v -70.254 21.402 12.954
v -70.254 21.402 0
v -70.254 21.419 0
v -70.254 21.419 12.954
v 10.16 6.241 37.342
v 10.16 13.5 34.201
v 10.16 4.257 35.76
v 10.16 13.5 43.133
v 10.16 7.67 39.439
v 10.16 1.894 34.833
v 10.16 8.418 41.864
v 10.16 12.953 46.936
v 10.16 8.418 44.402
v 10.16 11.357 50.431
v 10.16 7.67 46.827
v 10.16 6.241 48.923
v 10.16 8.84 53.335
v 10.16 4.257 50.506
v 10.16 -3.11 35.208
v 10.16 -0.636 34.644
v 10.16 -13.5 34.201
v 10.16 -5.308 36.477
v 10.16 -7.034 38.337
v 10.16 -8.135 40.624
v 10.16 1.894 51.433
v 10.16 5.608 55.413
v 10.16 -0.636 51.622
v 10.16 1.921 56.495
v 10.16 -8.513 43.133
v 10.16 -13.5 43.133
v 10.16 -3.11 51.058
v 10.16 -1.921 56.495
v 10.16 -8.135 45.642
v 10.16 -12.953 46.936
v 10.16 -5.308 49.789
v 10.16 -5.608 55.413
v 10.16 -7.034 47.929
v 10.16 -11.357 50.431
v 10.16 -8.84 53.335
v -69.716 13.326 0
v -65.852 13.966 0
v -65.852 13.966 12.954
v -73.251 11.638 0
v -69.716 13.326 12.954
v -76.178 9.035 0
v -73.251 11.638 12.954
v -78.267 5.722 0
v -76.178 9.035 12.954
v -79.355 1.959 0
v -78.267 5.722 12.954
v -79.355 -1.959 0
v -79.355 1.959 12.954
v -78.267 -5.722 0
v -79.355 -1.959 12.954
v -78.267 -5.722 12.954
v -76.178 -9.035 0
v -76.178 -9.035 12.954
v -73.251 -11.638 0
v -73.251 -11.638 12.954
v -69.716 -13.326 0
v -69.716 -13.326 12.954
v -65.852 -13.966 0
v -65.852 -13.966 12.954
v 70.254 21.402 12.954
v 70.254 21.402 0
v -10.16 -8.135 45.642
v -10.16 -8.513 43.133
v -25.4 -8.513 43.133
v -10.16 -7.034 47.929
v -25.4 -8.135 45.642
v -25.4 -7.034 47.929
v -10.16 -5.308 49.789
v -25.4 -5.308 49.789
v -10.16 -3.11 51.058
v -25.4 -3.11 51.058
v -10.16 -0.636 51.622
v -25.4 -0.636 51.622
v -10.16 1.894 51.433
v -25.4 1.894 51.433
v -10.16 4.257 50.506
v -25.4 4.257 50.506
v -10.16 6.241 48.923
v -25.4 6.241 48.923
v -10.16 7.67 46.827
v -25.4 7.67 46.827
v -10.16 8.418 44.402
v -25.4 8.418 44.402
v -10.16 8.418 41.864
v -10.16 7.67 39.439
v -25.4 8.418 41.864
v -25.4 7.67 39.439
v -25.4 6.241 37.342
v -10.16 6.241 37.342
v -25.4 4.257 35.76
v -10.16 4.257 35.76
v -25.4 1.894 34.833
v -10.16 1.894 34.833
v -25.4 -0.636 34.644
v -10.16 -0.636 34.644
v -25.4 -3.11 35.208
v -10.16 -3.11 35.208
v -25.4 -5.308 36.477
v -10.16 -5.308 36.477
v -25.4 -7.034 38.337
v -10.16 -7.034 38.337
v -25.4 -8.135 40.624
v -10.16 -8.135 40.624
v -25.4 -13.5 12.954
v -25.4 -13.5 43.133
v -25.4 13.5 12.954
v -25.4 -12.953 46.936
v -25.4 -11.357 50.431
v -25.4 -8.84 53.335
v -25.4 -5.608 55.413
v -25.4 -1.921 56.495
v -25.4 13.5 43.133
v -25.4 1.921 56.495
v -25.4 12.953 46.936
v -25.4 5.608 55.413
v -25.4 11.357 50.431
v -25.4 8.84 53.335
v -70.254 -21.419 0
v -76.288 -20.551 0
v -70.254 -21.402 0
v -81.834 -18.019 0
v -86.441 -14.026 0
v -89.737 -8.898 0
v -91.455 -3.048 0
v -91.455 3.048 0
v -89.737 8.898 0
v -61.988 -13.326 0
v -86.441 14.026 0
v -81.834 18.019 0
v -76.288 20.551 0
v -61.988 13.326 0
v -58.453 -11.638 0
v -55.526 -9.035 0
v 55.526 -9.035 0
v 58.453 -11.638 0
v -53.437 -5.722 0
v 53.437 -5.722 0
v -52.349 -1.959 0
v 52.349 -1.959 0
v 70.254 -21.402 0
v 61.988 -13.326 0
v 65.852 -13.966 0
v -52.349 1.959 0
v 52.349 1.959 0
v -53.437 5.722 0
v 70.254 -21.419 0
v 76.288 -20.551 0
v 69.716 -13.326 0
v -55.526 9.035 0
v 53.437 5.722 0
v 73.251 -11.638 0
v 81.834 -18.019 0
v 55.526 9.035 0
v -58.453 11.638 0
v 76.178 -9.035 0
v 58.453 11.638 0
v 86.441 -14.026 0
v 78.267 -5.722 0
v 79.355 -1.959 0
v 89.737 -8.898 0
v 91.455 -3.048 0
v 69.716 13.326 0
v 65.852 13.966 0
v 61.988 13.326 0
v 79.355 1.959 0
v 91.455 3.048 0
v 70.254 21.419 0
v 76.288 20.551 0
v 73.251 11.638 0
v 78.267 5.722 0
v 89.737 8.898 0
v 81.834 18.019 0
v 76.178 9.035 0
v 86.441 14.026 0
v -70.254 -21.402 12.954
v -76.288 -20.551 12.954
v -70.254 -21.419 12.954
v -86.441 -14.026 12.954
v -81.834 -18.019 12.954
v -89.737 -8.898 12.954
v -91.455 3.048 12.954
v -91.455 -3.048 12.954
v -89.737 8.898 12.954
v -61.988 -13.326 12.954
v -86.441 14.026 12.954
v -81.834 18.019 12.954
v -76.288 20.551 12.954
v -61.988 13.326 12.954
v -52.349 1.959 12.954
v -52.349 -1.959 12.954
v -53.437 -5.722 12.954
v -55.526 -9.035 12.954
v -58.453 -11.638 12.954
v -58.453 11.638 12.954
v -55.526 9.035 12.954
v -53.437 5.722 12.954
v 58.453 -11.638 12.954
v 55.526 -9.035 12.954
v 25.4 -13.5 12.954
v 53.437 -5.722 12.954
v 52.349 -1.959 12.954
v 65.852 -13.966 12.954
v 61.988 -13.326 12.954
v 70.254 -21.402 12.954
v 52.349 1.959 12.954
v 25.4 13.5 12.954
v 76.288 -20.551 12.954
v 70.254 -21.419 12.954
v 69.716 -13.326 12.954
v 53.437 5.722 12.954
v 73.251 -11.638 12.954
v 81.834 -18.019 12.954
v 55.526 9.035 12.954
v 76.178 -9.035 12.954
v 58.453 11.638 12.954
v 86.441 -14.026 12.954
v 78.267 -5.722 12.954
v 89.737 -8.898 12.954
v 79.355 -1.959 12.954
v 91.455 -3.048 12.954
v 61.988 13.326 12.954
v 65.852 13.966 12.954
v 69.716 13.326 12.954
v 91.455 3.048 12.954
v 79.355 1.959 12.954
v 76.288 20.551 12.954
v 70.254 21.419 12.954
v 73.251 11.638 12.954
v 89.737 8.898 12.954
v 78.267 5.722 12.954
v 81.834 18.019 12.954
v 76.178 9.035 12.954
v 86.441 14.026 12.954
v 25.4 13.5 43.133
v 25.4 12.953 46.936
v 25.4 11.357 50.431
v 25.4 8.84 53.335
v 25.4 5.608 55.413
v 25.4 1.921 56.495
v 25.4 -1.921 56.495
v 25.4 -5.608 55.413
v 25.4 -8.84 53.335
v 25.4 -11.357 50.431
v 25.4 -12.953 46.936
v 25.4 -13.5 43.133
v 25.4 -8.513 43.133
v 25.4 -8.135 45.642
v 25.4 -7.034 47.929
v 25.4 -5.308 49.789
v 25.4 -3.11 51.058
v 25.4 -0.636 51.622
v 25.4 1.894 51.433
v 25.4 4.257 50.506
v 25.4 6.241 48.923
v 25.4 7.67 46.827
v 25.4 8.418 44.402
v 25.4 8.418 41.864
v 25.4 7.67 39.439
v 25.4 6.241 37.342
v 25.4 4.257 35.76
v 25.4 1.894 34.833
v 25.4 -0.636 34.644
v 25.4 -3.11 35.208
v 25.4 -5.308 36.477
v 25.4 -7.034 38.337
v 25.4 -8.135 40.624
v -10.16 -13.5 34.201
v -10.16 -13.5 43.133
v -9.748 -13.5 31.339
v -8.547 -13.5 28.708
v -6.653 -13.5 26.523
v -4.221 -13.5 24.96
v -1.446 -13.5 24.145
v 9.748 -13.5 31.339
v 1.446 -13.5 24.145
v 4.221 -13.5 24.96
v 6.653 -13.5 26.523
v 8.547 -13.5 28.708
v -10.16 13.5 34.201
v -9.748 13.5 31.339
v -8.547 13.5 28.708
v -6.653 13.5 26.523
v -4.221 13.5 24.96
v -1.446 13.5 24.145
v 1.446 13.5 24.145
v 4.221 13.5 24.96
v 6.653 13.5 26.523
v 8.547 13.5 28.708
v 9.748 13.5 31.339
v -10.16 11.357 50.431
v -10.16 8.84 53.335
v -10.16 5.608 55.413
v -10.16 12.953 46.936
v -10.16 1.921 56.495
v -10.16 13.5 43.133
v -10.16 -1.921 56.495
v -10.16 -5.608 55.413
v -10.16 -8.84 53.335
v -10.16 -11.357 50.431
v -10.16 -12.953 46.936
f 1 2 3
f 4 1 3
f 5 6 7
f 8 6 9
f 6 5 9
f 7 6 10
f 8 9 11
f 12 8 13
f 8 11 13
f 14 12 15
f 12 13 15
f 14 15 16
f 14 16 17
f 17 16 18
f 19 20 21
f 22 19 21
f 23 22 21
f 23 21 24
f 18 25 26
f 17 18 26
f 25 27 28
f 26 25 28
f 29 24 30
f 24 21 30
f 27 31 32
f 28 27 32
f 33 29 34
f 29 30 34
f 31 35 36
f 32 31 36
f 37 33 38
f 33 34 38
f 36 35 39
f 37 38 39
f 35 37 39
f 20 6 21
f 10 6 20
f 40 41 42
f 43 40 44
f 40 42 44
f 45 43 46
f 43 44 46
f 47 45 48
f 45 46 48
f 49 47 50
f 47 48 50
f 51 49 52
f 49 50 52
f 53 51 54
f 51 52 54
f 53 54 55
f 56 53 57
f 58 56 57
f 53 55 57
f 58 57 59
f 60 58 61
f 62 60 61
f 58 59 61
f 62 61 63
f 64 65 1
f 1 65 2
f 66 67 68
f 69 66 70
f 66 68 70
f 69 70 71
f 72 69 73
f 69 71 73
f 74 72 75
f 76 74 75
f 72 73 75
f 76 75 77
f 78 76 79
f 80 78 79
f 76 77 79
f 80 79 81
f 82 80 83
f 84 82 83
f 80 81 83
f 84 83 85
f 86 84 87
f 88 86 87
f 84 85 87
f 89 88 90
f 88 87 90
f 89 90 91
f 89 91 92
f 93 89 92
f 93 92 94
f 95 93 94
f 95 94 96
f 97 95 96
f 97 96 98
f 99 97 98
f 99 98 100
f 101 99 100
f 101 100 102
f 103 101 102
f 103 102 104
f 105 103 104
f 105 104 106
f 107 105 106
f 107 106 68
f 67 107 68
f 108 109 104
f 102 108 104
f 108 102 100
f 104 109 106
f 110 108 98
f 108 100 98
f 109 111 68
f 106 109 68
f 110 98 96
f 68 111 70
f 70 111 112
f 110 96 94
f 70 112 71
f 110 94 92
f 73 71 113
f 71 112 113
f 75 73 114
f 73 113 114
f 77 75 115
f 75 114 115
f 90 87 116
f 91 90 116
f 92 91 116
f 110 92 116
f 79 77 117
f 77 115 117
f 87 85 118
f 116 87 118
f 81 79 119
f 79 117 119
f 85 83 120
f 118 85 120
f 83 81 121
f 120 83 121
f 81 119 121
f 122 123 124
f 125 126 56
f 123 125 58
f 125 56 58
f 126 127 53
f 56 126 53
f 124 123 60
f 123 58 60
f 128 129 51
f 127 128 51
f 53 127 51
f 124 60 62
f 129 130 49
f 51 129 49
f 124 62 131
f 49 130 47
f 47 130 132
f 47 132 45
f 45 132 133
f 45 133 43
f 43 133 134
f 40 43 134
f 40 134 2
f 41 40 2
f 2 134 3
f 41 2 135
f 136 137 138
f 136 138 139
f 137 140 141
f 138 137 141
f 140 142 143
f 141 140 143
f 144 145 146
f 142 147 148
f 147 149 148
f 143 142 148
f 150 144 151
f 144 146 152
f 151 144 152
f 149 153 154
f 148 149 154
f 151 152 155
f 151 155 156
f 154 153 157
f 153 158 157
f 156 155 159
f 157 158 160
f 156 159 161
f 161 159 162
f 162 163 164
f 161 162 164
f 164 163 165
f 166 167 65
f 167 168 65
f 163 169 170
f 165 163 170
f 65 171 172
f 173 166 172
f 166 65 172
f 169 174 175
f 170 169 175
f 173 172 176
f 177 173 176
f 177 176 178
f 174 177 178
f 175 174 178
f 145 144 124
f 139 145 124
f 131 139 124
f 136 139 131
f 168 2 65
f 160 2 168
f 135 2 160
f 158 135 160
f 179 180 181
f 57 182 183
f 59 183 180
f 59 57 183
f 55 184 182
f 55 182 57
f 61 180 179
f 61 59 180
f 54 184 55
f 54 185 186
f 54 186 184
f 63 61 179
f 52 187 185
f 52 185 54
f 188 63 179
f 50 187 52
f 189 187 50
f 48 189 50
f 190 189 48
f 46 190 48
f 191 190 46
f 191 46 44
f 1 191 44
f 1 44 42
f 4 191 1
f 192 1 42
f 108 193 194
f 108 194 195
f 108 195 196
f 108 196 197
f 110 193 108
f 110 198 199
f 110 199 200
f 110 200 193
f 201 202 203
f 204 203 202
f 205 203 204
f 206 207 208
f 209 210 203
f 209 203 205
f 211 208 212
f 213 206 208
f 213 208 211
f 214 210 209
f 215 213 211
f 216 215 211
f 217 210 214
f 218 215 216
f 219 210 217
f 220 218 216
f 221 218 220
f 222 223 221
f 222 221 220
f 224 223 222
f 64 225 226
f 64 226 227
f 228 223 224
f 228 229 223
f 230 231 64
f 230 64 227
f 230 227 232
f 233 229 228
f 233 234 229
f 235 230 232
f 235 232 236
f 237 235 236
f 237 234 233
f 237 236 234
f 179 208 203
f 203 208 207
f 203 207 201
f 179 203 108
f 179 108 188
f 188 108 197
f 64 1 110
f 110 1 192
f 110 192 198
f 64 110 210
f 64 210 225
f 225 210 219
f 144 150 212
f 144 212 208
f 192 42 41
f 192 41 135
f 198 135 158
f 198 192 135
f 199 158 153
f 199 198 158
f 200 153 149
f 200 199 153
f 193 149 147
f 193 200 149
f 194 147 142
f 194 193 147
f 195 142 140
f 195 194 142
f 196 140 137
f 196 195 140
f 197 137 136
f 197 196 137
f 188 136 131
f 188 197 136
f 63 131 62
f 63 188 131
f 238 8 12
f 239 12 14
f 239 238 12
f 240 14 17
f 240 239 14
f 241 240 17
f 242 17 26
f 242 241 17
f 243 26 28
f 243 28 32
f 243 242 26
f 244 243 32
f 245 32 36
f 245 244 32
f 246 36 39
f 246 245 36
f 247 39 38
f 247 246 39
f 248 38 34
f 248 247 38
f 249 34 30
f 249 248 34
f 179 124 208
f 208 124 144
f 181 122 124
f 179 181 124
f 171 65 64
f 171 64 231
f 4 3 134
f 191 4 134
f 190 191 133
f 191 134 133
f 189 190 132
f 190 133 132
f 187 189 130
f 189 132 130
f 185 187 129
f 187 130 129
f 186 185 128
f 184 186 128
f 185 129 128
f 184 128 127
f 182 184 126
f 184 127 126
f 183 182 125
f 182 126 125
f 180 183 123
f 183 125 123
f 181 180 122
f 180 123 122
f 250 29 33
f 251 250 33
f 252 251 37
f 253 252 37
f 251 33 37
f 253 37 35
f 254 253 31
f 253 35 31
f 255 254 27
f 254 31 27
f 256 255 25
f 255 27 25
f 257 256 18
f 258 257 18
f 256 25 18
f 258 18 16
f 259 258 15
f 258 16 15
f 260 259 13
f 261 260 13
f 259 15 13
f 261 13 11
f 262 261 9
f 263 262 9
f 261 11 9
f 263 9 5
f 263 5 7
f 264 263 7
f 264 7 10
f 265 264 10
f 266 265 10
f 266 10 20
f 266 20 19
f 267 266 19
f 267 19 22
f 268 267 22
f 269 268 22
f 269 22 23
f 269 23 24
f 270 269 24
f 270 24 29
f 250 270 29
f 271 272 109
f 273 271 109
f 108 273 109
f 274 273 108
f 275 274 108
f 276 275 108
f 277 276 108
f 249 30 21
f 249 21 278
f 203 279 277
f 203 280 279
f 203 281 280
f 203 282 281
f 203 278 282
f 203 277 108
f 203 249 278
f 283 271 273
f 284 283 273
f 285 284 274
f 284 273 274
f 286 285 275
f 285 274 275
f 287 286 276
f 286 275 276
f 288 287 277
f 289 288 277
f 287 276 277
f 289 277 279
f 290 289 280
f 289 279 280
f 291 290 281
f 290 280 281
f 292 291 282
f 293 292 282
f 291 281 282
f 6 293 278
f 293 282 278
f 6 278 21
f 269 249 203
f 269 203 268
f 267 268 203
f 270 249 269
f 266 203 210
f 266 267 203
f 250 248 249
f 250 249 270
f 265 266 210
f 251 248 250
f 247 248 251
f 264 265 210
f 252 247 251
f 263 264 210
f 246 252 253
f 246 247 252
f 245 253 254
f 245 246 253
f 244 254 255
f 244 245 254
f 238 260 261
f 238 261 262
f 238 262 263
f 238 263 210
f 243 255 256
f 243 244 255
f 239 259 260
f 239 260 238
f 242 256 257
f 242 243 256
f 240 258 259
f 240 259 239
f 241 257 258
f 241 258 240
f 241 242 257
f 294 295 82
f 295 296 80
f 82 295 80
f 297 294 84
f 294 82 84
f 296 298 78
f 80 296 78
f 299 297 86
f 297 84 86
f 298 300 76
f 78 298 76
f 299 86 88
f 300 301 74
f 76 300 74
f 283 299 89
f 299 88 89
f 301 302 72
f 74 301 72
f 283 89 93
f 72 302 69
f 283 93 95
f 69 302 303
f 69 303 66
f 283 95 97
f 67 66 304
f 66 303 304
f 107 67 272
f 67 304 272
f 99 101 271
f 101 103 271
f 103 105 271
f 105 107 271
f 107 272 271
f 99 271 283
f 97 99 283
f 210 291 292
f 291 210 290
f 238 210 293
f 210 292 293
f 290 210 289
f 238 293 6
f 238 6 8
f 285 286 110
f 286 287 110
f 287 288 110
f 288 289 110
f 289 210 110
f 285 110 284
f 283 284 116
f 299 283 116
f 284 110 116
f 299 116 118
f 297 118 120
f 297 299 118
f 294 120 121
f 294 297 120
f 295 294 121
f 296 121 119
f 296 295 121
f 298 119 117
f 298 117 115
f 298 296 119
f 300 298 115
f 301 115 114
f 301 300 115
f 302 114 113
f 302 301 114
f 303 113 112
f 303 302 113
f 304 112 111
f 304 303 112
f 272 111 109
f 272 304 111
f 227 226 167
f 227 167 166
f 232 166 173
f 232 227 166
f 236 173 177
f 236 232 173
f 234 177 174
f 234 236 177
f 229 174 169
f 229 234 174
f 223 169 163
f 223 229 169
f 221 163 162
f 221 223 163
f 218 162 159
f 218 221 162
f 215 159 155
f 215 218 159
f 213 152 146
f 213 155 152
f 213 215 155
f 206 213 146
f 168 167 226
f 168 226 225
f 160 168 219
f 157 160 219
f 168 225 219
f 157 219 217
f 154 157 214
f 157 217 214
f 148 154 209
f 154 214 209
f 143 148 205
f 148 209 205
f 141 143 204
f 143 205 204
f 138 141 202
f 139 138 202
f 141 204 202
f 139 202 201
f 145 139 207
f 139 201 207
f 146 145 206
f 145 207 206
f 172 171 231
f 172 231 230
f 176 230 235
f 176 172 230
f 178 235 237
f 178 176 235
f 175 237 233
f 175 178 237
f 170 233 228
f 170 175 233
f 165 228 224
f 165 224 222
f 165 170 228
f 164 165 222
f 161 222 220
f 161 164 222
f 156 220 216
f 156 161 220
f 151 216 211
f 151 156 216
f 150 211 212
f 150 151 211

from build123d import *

# Parameters (mm, degrees)
F1_DEPTH  = 12.954
F3_D      = 27.94
F3_DEPTH  = 20.32
F5_DEPTH  = 25.4
F8_DEPTH  = 34.919414
F9_R      = 8.513263
F10_DEPTH = 117.073686


with BuildPart() as f1:
    # F0 (on Top) → F1 (new body)
    with BuildSketch(Plane.XY):
        with BuildLine():
            Line((70.253901, 21.234231), (70.253901, 21.401851))
            Line((70.253901, 21.401851), (-70.253901, 21.401851))
            Line((-70.253901, 21.401851), (-70.253901, 21.418785))
            ThreePointArc((-70.253901, 21.418785), (-91.672686, 0), (-70.253901, -21.418785))
            Line((-70.253901, -21.418785), (-70.253901, -21.401851))
            Line((-70.253901, -21.401851), (70.253901, -21.401851))
            Line((70.253901, -21.401851), (70.253901, -21.234231))
            ThreePointArc((70.253901, -21.234231), (91.488132, 0), (70.253901, 21.234231))
        make_face()
    extrude(amount=F1_DEPTH)

    # F3
    with Locations(Plane(origin=(0, 0, 0), x_dir=(1, 0, 0), z_dir=(0, 0, -1))):
        with Locations((-65.522589, 0), (66.181116, 0)):
            Hole(F3_D / 2, depth=F3_DEPTH)

    # F4 (on Right) → F5 (join)
    with BuildSketch(Plane.YZ):
        with BuildLine():
            Line((-13.499629, 7.572964), (13.499629, 7.572964))
            Line((13.499629, 7.572964), (13.499629, 43.132961))
            ThreePointArc((13.499629, 43.132961), (0, 56.63259), (-13.499629, 43.132961))
            Line((-13.499629, 43.132961), (-13.499629, 7.572964))
        make_face()
    extrude(amount=F5_DEPTH)

    # F6: F1 across face


with BuildPart() as f1_1:
    add(f1.part)
    add(f1.part.mirror(Plane(origin=(0, 0, 33.456079), x_dir=(0, 1, 0), z_dir=(-1, 0, 0))))

    # F7 (on face) → F8 (cut, through all)
    with BuildSketch(Plane.XZ.offset(13.499629)):
        Polygon((-10.16, 59.448242), (-10.16, 43.132961), (-10.16, 34.201402), (10.16, 34.201402), (10.16, 43.132961), (10.16, 59.448242), align=None)
        with BuildLine():
            Line((10.16, 34.201402), (-10.16, 34.201402))
            ThreePointArc((-10.16, 34.201402), (0, 24.041402), (10.16, 34.201402))
        make_face()
    extrude(amount=-F8_DEPTH, mode=Mode.SUBTRACT)

    # F9 (on face) → F10 (cut, through all)
    with BuildSketch(Plane(origin=(-25.4, 0, 0), x_dir=(0, -1, 0), z_dir=(-1, 0, 0))):
        with Locations((0, 43.132961)):
            Circle(F9_R)
    extrude(amount=-F10_DEPTH, mode=Mode.SUBTRACT)


solid = f1_1.part
